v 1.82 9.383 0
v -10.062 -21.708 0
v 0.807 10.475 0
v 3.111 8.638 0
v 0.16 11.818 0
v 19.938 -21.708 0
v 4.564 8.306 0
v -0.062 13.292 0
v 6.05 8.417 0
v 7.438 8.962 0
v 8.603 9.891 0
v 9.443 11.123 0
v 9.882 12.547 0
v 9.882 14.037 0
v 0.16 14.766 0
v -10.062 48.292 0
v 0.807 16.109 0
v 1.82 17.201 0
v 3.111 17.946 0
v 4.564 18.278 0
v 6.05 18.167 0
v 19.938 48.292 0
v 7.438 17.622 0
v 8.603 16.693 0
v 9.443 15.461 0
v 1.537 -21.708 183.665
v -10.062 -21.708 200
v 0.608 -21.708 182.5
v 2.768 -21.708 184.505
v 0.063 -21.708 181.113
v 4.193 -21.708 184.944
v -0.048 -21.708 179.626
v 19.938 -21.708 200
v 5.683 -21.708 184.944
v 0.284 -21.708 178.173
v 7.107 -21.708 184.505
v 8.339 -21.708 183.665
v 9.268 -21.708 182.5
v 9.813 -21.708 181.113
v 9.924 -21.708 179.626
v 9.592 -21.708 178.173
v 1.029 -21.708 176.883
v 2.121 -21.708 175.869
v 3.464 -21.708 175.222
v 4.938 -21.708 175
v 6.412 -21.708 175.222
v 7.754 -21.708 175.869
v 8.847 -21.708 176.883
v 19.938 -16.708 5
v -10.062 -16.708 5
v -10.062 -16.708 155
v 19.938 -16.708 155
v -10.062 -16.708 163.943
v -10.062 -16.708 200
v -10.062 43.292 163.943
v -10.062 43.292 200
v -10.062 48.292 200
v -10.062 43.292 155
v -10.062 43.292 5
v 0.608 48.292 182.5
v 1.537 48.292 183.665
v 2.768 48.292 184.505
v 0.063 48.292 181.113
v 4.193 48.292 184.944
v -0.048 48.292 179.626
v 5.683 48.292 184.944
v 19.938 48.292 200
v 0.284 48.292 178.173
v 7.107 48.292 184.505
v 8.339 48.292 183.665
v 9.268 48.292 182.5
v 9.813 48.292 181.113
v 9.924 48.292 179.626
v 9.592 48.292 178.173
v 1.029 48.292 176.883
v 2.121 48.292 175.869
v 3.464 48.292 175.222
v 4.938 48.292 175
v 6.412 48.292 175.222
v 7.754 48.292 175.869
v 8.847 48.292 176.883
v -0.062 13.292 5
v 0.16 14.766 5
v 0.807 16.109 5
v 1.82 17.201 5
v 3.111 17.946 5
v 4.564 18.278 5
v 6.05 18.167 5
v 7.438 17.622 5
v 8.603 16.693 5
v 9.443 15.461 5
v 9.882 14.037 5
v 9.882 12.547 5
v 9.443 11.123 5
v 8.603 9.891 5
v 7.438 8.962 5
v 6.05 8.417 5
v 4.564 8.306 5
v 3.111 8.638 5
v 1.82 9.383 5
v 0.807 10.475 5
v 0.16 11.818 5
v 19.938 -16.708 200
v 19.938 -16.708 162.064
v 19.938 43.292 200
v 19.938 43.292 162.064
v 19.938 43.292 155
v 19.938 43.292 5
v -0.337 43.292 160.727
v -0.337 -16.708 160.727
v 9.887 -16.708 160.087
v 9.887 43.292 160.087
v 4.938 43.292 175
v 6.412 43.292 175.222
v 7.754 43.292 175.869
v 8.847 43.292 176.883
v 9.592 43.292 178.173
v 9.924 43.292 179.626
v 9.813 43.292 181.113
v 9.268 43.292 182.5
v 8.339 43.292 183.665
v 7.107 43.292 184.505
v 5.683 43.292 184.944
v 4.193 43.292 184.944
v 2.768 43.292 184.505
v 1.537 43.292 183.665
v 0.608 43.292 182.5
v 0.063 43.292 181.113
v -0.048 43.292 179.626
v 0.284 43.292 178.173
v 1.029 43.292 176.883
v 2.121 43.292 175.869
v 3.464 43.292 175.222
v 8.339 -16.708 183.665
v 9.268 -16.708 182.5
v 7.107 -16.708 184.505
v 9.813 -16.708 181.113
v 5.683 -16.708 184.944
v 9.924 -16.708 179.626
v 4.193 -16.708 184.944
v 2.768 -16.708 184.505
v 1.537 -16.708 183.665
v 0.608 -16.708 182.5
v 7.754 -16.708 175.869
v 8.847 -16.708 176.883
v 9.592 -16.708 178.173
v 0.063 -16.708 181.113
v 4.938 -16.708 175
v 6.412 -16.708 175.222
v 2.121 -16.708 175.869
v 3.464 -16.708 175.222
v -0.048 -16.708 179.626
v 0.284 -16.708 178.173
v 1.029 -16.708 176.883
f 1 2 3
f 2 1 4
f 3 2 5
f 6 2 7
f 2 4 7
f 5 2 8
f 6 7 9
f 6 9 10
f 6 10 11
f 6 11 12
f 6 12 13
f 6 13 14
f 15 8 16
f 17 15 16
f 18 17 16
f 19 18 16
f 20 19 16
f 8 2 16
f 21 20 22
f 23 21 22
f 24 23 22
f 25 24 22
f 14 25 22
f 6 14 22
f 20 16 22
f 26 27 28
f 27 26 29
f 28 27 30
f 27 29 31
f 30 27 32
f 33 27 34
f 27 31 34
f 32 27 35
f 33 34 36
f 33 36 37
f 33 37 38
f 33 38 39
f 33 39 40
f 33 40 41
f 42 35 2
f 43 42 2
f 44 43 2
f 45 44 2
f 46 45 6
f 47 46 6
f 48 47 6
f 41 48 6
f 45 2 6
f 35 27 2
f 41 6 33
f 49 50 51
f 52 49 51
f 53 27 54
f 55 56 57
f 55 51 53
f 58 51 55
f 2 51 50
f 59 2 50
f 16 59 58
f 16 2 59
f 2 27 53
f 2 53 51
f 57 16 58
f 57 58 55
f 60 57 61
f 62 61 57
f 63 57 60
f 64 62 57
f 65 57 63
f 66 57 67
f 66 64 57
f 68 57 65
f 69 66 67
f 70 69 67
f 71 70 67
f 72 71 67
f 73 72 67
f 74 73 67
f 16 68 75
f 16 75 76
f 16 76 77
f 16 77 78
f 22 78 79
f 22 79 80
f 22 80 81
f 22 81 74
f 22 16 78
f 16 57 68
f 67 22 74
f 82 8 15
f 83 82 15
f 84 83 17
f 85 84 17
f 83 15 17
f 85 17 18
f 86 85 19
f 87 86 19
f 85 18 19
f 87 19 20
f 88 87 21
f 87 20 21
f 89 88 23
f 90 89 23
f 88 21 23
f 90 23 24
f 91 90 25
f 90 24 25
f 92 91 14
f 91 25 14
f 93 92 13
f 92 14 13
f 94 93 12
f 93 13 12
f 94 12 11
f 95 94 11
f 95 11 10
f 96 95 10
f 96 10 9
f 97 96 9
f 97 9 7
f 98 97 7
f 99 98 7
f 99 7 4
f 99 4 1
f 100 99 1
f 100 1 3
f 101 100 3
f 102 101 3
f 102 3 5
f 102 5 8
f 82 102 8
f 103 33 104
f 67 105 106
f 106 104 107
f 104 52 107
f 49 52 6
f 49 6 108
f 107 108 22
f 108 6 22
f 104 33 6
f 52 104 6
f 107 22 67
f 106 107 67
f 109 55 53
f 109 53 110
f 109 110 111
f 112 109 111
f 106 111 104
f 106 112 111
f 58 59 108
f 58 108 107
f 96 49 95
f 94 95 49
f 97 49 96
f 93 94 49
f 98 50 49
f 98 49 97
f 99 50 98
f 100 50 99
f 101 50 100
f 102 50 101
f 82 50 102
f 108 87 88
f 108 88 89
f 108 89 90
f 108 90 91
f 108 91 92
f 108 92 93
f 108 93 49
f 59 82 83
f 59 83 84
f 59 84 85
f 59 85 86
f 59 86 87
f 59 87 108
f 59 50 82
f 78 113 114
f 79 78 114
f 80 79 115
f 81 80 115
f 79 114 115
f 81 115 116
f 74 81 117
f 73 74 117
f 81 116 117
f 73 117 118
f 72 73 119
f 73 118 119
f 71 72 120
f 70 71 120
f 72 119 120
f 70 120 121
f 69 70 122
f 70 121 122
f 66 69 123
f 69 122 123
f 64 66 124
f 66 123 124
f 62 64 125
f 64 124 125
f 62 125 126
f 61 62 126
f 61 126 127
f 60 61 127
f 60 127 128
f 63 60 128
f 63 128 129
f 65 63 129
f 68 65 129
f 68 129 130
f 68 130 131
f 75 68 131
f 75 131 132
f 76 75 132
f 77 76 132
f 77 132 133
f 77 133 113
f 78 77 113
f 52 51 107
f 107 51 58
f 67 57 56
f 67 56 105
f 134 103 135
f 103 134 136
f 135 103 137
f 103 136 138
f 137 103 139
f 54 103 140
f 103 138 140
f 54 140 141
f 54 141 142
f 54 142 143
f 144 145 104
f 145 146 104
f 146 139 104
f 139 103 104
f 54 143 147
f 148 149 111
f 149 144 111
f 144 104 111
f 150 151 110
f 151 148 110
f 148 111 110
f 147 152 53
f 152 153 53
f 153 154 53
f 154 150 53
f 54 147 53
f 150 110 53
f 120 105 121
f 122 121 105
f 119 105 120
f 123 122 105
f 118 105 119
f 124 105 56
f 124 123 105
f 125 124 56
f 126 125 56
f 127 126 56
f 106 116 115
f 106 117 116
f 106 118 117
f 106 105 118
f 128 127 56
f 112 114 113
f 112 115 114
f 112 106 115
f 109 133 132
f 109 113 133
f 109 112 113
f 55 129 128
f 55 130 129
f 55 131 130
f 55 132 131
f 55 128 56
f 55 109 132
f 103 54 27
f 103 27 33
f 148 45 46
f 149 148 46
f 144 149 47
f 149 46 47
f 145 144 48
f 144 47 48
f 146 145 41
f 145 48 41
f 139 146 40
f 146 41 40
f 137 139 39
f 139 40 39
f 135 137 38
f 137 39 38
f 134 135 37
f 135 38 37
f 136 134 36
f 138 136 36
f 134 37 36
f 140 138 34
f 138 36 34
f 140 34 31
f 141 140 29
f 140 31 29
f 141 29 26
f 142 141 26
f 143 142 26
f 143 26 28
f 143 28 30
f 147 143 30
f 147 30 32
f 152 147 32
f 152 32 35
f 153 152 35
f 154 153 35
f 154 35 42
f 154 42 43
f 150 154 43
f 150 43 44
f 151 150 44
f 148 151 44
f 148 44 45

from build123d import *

# Parameters (mm, degrees)
CROQUIS1_W                 = 30
CROQUIS1_H                 = 70
SALIENTE_EXTRUIR1_DEPTH    = 200
CROQUIS5_R                 = 5
CORTAR_EXTRUIR2_DEPTH      = 20
CORTAR_EXTRUIR3_DEPTH      = 30
CORTAR_EXTRUIR3_DEPTH_BACK = 30
CROQUIS6_R                 = 40
CROQUIS7_W                 = 150
CROQUIS7_H                 = 60
CORTAR_EXTRUIR4_DEPTH      = 208.923327371
CROQUIS8_R                 = 5
CORTAR_EXTRUIR5_DEPTH      = 213.832138987


with BuildPart() as part:
    # Croquis1 → Saliente-Extruir1 (new body)
    with BuildSketch(Plane.XY):
        with Locations((4.937888199, 13.291925466)):
            Rectangle(CROQUIS1_W, CROQUIS1_H)
    extrude(amount=SALIENTE_EXTRUIR1_DEPTH)

    # Croquis5 → Cortar-Extruir2 (cut)
    with BuildSketch(Plane(origin=(0, 0, 0), x_dir=(-1, 0, 0), z_dir=(0, 0, -1))):
        with Locations((-4.937888199, 13.291925466)):
            Circle(CROQUIS5_R)
    extrude(amount=-CORTAR_EXTRUIR2_DEPTH, mode=Mode.SUBTRACT)

    # Croquis6 → Cortar-Extruir3 (cut, two sides: drawn at the far end of the back side and taken through both)
    with BuildSketch(Plane(origin=(0, 13.291925466, 0), x_dir=(-1, 0, 0), z_dir=(0, -1, 0)).offset(-CORTAR_EXTRUIR3_DEPTH_BACK)):
        with Locations((-7.25559109, -200)):
            Circle(CROQUIS6_R)
    extrude(amount=CORTAR_EXTRUIR3_DEPTH + CORTAR_EXTRUIR3_DEPTH_BACK, mode=Mode.SUBTRACT)

    # Croquis7 → Cortar-Extruir4 (cut, through all)
    with BuildSketch(Plane.ZY.offset(10.062111801)):
        with Locations((80, 13.291925466)):
            Rectangle(CROQUIS7_W, CROQUIS7_H)
    extrude(amount=-CORTAR_EXTRUIR4_DEPTH, mode=Mode.SUBTRACT)

    # Croquis8 → Cortar-Extruir5 (cut, through all)
    with BuildSketch(Plane(origin=(0, -21.708074534, 0), x_dir=(-1, 0, 0), z_dir=(0, -1, 0))):
        with Locations((-4.937888199, -180)):
            Circle(CROQUIS8_R)
    extrude(amount=-CORTAR_EXTRUIR5_DEPTH, mode=Mode.SUBTRACT)


solid = part.part
